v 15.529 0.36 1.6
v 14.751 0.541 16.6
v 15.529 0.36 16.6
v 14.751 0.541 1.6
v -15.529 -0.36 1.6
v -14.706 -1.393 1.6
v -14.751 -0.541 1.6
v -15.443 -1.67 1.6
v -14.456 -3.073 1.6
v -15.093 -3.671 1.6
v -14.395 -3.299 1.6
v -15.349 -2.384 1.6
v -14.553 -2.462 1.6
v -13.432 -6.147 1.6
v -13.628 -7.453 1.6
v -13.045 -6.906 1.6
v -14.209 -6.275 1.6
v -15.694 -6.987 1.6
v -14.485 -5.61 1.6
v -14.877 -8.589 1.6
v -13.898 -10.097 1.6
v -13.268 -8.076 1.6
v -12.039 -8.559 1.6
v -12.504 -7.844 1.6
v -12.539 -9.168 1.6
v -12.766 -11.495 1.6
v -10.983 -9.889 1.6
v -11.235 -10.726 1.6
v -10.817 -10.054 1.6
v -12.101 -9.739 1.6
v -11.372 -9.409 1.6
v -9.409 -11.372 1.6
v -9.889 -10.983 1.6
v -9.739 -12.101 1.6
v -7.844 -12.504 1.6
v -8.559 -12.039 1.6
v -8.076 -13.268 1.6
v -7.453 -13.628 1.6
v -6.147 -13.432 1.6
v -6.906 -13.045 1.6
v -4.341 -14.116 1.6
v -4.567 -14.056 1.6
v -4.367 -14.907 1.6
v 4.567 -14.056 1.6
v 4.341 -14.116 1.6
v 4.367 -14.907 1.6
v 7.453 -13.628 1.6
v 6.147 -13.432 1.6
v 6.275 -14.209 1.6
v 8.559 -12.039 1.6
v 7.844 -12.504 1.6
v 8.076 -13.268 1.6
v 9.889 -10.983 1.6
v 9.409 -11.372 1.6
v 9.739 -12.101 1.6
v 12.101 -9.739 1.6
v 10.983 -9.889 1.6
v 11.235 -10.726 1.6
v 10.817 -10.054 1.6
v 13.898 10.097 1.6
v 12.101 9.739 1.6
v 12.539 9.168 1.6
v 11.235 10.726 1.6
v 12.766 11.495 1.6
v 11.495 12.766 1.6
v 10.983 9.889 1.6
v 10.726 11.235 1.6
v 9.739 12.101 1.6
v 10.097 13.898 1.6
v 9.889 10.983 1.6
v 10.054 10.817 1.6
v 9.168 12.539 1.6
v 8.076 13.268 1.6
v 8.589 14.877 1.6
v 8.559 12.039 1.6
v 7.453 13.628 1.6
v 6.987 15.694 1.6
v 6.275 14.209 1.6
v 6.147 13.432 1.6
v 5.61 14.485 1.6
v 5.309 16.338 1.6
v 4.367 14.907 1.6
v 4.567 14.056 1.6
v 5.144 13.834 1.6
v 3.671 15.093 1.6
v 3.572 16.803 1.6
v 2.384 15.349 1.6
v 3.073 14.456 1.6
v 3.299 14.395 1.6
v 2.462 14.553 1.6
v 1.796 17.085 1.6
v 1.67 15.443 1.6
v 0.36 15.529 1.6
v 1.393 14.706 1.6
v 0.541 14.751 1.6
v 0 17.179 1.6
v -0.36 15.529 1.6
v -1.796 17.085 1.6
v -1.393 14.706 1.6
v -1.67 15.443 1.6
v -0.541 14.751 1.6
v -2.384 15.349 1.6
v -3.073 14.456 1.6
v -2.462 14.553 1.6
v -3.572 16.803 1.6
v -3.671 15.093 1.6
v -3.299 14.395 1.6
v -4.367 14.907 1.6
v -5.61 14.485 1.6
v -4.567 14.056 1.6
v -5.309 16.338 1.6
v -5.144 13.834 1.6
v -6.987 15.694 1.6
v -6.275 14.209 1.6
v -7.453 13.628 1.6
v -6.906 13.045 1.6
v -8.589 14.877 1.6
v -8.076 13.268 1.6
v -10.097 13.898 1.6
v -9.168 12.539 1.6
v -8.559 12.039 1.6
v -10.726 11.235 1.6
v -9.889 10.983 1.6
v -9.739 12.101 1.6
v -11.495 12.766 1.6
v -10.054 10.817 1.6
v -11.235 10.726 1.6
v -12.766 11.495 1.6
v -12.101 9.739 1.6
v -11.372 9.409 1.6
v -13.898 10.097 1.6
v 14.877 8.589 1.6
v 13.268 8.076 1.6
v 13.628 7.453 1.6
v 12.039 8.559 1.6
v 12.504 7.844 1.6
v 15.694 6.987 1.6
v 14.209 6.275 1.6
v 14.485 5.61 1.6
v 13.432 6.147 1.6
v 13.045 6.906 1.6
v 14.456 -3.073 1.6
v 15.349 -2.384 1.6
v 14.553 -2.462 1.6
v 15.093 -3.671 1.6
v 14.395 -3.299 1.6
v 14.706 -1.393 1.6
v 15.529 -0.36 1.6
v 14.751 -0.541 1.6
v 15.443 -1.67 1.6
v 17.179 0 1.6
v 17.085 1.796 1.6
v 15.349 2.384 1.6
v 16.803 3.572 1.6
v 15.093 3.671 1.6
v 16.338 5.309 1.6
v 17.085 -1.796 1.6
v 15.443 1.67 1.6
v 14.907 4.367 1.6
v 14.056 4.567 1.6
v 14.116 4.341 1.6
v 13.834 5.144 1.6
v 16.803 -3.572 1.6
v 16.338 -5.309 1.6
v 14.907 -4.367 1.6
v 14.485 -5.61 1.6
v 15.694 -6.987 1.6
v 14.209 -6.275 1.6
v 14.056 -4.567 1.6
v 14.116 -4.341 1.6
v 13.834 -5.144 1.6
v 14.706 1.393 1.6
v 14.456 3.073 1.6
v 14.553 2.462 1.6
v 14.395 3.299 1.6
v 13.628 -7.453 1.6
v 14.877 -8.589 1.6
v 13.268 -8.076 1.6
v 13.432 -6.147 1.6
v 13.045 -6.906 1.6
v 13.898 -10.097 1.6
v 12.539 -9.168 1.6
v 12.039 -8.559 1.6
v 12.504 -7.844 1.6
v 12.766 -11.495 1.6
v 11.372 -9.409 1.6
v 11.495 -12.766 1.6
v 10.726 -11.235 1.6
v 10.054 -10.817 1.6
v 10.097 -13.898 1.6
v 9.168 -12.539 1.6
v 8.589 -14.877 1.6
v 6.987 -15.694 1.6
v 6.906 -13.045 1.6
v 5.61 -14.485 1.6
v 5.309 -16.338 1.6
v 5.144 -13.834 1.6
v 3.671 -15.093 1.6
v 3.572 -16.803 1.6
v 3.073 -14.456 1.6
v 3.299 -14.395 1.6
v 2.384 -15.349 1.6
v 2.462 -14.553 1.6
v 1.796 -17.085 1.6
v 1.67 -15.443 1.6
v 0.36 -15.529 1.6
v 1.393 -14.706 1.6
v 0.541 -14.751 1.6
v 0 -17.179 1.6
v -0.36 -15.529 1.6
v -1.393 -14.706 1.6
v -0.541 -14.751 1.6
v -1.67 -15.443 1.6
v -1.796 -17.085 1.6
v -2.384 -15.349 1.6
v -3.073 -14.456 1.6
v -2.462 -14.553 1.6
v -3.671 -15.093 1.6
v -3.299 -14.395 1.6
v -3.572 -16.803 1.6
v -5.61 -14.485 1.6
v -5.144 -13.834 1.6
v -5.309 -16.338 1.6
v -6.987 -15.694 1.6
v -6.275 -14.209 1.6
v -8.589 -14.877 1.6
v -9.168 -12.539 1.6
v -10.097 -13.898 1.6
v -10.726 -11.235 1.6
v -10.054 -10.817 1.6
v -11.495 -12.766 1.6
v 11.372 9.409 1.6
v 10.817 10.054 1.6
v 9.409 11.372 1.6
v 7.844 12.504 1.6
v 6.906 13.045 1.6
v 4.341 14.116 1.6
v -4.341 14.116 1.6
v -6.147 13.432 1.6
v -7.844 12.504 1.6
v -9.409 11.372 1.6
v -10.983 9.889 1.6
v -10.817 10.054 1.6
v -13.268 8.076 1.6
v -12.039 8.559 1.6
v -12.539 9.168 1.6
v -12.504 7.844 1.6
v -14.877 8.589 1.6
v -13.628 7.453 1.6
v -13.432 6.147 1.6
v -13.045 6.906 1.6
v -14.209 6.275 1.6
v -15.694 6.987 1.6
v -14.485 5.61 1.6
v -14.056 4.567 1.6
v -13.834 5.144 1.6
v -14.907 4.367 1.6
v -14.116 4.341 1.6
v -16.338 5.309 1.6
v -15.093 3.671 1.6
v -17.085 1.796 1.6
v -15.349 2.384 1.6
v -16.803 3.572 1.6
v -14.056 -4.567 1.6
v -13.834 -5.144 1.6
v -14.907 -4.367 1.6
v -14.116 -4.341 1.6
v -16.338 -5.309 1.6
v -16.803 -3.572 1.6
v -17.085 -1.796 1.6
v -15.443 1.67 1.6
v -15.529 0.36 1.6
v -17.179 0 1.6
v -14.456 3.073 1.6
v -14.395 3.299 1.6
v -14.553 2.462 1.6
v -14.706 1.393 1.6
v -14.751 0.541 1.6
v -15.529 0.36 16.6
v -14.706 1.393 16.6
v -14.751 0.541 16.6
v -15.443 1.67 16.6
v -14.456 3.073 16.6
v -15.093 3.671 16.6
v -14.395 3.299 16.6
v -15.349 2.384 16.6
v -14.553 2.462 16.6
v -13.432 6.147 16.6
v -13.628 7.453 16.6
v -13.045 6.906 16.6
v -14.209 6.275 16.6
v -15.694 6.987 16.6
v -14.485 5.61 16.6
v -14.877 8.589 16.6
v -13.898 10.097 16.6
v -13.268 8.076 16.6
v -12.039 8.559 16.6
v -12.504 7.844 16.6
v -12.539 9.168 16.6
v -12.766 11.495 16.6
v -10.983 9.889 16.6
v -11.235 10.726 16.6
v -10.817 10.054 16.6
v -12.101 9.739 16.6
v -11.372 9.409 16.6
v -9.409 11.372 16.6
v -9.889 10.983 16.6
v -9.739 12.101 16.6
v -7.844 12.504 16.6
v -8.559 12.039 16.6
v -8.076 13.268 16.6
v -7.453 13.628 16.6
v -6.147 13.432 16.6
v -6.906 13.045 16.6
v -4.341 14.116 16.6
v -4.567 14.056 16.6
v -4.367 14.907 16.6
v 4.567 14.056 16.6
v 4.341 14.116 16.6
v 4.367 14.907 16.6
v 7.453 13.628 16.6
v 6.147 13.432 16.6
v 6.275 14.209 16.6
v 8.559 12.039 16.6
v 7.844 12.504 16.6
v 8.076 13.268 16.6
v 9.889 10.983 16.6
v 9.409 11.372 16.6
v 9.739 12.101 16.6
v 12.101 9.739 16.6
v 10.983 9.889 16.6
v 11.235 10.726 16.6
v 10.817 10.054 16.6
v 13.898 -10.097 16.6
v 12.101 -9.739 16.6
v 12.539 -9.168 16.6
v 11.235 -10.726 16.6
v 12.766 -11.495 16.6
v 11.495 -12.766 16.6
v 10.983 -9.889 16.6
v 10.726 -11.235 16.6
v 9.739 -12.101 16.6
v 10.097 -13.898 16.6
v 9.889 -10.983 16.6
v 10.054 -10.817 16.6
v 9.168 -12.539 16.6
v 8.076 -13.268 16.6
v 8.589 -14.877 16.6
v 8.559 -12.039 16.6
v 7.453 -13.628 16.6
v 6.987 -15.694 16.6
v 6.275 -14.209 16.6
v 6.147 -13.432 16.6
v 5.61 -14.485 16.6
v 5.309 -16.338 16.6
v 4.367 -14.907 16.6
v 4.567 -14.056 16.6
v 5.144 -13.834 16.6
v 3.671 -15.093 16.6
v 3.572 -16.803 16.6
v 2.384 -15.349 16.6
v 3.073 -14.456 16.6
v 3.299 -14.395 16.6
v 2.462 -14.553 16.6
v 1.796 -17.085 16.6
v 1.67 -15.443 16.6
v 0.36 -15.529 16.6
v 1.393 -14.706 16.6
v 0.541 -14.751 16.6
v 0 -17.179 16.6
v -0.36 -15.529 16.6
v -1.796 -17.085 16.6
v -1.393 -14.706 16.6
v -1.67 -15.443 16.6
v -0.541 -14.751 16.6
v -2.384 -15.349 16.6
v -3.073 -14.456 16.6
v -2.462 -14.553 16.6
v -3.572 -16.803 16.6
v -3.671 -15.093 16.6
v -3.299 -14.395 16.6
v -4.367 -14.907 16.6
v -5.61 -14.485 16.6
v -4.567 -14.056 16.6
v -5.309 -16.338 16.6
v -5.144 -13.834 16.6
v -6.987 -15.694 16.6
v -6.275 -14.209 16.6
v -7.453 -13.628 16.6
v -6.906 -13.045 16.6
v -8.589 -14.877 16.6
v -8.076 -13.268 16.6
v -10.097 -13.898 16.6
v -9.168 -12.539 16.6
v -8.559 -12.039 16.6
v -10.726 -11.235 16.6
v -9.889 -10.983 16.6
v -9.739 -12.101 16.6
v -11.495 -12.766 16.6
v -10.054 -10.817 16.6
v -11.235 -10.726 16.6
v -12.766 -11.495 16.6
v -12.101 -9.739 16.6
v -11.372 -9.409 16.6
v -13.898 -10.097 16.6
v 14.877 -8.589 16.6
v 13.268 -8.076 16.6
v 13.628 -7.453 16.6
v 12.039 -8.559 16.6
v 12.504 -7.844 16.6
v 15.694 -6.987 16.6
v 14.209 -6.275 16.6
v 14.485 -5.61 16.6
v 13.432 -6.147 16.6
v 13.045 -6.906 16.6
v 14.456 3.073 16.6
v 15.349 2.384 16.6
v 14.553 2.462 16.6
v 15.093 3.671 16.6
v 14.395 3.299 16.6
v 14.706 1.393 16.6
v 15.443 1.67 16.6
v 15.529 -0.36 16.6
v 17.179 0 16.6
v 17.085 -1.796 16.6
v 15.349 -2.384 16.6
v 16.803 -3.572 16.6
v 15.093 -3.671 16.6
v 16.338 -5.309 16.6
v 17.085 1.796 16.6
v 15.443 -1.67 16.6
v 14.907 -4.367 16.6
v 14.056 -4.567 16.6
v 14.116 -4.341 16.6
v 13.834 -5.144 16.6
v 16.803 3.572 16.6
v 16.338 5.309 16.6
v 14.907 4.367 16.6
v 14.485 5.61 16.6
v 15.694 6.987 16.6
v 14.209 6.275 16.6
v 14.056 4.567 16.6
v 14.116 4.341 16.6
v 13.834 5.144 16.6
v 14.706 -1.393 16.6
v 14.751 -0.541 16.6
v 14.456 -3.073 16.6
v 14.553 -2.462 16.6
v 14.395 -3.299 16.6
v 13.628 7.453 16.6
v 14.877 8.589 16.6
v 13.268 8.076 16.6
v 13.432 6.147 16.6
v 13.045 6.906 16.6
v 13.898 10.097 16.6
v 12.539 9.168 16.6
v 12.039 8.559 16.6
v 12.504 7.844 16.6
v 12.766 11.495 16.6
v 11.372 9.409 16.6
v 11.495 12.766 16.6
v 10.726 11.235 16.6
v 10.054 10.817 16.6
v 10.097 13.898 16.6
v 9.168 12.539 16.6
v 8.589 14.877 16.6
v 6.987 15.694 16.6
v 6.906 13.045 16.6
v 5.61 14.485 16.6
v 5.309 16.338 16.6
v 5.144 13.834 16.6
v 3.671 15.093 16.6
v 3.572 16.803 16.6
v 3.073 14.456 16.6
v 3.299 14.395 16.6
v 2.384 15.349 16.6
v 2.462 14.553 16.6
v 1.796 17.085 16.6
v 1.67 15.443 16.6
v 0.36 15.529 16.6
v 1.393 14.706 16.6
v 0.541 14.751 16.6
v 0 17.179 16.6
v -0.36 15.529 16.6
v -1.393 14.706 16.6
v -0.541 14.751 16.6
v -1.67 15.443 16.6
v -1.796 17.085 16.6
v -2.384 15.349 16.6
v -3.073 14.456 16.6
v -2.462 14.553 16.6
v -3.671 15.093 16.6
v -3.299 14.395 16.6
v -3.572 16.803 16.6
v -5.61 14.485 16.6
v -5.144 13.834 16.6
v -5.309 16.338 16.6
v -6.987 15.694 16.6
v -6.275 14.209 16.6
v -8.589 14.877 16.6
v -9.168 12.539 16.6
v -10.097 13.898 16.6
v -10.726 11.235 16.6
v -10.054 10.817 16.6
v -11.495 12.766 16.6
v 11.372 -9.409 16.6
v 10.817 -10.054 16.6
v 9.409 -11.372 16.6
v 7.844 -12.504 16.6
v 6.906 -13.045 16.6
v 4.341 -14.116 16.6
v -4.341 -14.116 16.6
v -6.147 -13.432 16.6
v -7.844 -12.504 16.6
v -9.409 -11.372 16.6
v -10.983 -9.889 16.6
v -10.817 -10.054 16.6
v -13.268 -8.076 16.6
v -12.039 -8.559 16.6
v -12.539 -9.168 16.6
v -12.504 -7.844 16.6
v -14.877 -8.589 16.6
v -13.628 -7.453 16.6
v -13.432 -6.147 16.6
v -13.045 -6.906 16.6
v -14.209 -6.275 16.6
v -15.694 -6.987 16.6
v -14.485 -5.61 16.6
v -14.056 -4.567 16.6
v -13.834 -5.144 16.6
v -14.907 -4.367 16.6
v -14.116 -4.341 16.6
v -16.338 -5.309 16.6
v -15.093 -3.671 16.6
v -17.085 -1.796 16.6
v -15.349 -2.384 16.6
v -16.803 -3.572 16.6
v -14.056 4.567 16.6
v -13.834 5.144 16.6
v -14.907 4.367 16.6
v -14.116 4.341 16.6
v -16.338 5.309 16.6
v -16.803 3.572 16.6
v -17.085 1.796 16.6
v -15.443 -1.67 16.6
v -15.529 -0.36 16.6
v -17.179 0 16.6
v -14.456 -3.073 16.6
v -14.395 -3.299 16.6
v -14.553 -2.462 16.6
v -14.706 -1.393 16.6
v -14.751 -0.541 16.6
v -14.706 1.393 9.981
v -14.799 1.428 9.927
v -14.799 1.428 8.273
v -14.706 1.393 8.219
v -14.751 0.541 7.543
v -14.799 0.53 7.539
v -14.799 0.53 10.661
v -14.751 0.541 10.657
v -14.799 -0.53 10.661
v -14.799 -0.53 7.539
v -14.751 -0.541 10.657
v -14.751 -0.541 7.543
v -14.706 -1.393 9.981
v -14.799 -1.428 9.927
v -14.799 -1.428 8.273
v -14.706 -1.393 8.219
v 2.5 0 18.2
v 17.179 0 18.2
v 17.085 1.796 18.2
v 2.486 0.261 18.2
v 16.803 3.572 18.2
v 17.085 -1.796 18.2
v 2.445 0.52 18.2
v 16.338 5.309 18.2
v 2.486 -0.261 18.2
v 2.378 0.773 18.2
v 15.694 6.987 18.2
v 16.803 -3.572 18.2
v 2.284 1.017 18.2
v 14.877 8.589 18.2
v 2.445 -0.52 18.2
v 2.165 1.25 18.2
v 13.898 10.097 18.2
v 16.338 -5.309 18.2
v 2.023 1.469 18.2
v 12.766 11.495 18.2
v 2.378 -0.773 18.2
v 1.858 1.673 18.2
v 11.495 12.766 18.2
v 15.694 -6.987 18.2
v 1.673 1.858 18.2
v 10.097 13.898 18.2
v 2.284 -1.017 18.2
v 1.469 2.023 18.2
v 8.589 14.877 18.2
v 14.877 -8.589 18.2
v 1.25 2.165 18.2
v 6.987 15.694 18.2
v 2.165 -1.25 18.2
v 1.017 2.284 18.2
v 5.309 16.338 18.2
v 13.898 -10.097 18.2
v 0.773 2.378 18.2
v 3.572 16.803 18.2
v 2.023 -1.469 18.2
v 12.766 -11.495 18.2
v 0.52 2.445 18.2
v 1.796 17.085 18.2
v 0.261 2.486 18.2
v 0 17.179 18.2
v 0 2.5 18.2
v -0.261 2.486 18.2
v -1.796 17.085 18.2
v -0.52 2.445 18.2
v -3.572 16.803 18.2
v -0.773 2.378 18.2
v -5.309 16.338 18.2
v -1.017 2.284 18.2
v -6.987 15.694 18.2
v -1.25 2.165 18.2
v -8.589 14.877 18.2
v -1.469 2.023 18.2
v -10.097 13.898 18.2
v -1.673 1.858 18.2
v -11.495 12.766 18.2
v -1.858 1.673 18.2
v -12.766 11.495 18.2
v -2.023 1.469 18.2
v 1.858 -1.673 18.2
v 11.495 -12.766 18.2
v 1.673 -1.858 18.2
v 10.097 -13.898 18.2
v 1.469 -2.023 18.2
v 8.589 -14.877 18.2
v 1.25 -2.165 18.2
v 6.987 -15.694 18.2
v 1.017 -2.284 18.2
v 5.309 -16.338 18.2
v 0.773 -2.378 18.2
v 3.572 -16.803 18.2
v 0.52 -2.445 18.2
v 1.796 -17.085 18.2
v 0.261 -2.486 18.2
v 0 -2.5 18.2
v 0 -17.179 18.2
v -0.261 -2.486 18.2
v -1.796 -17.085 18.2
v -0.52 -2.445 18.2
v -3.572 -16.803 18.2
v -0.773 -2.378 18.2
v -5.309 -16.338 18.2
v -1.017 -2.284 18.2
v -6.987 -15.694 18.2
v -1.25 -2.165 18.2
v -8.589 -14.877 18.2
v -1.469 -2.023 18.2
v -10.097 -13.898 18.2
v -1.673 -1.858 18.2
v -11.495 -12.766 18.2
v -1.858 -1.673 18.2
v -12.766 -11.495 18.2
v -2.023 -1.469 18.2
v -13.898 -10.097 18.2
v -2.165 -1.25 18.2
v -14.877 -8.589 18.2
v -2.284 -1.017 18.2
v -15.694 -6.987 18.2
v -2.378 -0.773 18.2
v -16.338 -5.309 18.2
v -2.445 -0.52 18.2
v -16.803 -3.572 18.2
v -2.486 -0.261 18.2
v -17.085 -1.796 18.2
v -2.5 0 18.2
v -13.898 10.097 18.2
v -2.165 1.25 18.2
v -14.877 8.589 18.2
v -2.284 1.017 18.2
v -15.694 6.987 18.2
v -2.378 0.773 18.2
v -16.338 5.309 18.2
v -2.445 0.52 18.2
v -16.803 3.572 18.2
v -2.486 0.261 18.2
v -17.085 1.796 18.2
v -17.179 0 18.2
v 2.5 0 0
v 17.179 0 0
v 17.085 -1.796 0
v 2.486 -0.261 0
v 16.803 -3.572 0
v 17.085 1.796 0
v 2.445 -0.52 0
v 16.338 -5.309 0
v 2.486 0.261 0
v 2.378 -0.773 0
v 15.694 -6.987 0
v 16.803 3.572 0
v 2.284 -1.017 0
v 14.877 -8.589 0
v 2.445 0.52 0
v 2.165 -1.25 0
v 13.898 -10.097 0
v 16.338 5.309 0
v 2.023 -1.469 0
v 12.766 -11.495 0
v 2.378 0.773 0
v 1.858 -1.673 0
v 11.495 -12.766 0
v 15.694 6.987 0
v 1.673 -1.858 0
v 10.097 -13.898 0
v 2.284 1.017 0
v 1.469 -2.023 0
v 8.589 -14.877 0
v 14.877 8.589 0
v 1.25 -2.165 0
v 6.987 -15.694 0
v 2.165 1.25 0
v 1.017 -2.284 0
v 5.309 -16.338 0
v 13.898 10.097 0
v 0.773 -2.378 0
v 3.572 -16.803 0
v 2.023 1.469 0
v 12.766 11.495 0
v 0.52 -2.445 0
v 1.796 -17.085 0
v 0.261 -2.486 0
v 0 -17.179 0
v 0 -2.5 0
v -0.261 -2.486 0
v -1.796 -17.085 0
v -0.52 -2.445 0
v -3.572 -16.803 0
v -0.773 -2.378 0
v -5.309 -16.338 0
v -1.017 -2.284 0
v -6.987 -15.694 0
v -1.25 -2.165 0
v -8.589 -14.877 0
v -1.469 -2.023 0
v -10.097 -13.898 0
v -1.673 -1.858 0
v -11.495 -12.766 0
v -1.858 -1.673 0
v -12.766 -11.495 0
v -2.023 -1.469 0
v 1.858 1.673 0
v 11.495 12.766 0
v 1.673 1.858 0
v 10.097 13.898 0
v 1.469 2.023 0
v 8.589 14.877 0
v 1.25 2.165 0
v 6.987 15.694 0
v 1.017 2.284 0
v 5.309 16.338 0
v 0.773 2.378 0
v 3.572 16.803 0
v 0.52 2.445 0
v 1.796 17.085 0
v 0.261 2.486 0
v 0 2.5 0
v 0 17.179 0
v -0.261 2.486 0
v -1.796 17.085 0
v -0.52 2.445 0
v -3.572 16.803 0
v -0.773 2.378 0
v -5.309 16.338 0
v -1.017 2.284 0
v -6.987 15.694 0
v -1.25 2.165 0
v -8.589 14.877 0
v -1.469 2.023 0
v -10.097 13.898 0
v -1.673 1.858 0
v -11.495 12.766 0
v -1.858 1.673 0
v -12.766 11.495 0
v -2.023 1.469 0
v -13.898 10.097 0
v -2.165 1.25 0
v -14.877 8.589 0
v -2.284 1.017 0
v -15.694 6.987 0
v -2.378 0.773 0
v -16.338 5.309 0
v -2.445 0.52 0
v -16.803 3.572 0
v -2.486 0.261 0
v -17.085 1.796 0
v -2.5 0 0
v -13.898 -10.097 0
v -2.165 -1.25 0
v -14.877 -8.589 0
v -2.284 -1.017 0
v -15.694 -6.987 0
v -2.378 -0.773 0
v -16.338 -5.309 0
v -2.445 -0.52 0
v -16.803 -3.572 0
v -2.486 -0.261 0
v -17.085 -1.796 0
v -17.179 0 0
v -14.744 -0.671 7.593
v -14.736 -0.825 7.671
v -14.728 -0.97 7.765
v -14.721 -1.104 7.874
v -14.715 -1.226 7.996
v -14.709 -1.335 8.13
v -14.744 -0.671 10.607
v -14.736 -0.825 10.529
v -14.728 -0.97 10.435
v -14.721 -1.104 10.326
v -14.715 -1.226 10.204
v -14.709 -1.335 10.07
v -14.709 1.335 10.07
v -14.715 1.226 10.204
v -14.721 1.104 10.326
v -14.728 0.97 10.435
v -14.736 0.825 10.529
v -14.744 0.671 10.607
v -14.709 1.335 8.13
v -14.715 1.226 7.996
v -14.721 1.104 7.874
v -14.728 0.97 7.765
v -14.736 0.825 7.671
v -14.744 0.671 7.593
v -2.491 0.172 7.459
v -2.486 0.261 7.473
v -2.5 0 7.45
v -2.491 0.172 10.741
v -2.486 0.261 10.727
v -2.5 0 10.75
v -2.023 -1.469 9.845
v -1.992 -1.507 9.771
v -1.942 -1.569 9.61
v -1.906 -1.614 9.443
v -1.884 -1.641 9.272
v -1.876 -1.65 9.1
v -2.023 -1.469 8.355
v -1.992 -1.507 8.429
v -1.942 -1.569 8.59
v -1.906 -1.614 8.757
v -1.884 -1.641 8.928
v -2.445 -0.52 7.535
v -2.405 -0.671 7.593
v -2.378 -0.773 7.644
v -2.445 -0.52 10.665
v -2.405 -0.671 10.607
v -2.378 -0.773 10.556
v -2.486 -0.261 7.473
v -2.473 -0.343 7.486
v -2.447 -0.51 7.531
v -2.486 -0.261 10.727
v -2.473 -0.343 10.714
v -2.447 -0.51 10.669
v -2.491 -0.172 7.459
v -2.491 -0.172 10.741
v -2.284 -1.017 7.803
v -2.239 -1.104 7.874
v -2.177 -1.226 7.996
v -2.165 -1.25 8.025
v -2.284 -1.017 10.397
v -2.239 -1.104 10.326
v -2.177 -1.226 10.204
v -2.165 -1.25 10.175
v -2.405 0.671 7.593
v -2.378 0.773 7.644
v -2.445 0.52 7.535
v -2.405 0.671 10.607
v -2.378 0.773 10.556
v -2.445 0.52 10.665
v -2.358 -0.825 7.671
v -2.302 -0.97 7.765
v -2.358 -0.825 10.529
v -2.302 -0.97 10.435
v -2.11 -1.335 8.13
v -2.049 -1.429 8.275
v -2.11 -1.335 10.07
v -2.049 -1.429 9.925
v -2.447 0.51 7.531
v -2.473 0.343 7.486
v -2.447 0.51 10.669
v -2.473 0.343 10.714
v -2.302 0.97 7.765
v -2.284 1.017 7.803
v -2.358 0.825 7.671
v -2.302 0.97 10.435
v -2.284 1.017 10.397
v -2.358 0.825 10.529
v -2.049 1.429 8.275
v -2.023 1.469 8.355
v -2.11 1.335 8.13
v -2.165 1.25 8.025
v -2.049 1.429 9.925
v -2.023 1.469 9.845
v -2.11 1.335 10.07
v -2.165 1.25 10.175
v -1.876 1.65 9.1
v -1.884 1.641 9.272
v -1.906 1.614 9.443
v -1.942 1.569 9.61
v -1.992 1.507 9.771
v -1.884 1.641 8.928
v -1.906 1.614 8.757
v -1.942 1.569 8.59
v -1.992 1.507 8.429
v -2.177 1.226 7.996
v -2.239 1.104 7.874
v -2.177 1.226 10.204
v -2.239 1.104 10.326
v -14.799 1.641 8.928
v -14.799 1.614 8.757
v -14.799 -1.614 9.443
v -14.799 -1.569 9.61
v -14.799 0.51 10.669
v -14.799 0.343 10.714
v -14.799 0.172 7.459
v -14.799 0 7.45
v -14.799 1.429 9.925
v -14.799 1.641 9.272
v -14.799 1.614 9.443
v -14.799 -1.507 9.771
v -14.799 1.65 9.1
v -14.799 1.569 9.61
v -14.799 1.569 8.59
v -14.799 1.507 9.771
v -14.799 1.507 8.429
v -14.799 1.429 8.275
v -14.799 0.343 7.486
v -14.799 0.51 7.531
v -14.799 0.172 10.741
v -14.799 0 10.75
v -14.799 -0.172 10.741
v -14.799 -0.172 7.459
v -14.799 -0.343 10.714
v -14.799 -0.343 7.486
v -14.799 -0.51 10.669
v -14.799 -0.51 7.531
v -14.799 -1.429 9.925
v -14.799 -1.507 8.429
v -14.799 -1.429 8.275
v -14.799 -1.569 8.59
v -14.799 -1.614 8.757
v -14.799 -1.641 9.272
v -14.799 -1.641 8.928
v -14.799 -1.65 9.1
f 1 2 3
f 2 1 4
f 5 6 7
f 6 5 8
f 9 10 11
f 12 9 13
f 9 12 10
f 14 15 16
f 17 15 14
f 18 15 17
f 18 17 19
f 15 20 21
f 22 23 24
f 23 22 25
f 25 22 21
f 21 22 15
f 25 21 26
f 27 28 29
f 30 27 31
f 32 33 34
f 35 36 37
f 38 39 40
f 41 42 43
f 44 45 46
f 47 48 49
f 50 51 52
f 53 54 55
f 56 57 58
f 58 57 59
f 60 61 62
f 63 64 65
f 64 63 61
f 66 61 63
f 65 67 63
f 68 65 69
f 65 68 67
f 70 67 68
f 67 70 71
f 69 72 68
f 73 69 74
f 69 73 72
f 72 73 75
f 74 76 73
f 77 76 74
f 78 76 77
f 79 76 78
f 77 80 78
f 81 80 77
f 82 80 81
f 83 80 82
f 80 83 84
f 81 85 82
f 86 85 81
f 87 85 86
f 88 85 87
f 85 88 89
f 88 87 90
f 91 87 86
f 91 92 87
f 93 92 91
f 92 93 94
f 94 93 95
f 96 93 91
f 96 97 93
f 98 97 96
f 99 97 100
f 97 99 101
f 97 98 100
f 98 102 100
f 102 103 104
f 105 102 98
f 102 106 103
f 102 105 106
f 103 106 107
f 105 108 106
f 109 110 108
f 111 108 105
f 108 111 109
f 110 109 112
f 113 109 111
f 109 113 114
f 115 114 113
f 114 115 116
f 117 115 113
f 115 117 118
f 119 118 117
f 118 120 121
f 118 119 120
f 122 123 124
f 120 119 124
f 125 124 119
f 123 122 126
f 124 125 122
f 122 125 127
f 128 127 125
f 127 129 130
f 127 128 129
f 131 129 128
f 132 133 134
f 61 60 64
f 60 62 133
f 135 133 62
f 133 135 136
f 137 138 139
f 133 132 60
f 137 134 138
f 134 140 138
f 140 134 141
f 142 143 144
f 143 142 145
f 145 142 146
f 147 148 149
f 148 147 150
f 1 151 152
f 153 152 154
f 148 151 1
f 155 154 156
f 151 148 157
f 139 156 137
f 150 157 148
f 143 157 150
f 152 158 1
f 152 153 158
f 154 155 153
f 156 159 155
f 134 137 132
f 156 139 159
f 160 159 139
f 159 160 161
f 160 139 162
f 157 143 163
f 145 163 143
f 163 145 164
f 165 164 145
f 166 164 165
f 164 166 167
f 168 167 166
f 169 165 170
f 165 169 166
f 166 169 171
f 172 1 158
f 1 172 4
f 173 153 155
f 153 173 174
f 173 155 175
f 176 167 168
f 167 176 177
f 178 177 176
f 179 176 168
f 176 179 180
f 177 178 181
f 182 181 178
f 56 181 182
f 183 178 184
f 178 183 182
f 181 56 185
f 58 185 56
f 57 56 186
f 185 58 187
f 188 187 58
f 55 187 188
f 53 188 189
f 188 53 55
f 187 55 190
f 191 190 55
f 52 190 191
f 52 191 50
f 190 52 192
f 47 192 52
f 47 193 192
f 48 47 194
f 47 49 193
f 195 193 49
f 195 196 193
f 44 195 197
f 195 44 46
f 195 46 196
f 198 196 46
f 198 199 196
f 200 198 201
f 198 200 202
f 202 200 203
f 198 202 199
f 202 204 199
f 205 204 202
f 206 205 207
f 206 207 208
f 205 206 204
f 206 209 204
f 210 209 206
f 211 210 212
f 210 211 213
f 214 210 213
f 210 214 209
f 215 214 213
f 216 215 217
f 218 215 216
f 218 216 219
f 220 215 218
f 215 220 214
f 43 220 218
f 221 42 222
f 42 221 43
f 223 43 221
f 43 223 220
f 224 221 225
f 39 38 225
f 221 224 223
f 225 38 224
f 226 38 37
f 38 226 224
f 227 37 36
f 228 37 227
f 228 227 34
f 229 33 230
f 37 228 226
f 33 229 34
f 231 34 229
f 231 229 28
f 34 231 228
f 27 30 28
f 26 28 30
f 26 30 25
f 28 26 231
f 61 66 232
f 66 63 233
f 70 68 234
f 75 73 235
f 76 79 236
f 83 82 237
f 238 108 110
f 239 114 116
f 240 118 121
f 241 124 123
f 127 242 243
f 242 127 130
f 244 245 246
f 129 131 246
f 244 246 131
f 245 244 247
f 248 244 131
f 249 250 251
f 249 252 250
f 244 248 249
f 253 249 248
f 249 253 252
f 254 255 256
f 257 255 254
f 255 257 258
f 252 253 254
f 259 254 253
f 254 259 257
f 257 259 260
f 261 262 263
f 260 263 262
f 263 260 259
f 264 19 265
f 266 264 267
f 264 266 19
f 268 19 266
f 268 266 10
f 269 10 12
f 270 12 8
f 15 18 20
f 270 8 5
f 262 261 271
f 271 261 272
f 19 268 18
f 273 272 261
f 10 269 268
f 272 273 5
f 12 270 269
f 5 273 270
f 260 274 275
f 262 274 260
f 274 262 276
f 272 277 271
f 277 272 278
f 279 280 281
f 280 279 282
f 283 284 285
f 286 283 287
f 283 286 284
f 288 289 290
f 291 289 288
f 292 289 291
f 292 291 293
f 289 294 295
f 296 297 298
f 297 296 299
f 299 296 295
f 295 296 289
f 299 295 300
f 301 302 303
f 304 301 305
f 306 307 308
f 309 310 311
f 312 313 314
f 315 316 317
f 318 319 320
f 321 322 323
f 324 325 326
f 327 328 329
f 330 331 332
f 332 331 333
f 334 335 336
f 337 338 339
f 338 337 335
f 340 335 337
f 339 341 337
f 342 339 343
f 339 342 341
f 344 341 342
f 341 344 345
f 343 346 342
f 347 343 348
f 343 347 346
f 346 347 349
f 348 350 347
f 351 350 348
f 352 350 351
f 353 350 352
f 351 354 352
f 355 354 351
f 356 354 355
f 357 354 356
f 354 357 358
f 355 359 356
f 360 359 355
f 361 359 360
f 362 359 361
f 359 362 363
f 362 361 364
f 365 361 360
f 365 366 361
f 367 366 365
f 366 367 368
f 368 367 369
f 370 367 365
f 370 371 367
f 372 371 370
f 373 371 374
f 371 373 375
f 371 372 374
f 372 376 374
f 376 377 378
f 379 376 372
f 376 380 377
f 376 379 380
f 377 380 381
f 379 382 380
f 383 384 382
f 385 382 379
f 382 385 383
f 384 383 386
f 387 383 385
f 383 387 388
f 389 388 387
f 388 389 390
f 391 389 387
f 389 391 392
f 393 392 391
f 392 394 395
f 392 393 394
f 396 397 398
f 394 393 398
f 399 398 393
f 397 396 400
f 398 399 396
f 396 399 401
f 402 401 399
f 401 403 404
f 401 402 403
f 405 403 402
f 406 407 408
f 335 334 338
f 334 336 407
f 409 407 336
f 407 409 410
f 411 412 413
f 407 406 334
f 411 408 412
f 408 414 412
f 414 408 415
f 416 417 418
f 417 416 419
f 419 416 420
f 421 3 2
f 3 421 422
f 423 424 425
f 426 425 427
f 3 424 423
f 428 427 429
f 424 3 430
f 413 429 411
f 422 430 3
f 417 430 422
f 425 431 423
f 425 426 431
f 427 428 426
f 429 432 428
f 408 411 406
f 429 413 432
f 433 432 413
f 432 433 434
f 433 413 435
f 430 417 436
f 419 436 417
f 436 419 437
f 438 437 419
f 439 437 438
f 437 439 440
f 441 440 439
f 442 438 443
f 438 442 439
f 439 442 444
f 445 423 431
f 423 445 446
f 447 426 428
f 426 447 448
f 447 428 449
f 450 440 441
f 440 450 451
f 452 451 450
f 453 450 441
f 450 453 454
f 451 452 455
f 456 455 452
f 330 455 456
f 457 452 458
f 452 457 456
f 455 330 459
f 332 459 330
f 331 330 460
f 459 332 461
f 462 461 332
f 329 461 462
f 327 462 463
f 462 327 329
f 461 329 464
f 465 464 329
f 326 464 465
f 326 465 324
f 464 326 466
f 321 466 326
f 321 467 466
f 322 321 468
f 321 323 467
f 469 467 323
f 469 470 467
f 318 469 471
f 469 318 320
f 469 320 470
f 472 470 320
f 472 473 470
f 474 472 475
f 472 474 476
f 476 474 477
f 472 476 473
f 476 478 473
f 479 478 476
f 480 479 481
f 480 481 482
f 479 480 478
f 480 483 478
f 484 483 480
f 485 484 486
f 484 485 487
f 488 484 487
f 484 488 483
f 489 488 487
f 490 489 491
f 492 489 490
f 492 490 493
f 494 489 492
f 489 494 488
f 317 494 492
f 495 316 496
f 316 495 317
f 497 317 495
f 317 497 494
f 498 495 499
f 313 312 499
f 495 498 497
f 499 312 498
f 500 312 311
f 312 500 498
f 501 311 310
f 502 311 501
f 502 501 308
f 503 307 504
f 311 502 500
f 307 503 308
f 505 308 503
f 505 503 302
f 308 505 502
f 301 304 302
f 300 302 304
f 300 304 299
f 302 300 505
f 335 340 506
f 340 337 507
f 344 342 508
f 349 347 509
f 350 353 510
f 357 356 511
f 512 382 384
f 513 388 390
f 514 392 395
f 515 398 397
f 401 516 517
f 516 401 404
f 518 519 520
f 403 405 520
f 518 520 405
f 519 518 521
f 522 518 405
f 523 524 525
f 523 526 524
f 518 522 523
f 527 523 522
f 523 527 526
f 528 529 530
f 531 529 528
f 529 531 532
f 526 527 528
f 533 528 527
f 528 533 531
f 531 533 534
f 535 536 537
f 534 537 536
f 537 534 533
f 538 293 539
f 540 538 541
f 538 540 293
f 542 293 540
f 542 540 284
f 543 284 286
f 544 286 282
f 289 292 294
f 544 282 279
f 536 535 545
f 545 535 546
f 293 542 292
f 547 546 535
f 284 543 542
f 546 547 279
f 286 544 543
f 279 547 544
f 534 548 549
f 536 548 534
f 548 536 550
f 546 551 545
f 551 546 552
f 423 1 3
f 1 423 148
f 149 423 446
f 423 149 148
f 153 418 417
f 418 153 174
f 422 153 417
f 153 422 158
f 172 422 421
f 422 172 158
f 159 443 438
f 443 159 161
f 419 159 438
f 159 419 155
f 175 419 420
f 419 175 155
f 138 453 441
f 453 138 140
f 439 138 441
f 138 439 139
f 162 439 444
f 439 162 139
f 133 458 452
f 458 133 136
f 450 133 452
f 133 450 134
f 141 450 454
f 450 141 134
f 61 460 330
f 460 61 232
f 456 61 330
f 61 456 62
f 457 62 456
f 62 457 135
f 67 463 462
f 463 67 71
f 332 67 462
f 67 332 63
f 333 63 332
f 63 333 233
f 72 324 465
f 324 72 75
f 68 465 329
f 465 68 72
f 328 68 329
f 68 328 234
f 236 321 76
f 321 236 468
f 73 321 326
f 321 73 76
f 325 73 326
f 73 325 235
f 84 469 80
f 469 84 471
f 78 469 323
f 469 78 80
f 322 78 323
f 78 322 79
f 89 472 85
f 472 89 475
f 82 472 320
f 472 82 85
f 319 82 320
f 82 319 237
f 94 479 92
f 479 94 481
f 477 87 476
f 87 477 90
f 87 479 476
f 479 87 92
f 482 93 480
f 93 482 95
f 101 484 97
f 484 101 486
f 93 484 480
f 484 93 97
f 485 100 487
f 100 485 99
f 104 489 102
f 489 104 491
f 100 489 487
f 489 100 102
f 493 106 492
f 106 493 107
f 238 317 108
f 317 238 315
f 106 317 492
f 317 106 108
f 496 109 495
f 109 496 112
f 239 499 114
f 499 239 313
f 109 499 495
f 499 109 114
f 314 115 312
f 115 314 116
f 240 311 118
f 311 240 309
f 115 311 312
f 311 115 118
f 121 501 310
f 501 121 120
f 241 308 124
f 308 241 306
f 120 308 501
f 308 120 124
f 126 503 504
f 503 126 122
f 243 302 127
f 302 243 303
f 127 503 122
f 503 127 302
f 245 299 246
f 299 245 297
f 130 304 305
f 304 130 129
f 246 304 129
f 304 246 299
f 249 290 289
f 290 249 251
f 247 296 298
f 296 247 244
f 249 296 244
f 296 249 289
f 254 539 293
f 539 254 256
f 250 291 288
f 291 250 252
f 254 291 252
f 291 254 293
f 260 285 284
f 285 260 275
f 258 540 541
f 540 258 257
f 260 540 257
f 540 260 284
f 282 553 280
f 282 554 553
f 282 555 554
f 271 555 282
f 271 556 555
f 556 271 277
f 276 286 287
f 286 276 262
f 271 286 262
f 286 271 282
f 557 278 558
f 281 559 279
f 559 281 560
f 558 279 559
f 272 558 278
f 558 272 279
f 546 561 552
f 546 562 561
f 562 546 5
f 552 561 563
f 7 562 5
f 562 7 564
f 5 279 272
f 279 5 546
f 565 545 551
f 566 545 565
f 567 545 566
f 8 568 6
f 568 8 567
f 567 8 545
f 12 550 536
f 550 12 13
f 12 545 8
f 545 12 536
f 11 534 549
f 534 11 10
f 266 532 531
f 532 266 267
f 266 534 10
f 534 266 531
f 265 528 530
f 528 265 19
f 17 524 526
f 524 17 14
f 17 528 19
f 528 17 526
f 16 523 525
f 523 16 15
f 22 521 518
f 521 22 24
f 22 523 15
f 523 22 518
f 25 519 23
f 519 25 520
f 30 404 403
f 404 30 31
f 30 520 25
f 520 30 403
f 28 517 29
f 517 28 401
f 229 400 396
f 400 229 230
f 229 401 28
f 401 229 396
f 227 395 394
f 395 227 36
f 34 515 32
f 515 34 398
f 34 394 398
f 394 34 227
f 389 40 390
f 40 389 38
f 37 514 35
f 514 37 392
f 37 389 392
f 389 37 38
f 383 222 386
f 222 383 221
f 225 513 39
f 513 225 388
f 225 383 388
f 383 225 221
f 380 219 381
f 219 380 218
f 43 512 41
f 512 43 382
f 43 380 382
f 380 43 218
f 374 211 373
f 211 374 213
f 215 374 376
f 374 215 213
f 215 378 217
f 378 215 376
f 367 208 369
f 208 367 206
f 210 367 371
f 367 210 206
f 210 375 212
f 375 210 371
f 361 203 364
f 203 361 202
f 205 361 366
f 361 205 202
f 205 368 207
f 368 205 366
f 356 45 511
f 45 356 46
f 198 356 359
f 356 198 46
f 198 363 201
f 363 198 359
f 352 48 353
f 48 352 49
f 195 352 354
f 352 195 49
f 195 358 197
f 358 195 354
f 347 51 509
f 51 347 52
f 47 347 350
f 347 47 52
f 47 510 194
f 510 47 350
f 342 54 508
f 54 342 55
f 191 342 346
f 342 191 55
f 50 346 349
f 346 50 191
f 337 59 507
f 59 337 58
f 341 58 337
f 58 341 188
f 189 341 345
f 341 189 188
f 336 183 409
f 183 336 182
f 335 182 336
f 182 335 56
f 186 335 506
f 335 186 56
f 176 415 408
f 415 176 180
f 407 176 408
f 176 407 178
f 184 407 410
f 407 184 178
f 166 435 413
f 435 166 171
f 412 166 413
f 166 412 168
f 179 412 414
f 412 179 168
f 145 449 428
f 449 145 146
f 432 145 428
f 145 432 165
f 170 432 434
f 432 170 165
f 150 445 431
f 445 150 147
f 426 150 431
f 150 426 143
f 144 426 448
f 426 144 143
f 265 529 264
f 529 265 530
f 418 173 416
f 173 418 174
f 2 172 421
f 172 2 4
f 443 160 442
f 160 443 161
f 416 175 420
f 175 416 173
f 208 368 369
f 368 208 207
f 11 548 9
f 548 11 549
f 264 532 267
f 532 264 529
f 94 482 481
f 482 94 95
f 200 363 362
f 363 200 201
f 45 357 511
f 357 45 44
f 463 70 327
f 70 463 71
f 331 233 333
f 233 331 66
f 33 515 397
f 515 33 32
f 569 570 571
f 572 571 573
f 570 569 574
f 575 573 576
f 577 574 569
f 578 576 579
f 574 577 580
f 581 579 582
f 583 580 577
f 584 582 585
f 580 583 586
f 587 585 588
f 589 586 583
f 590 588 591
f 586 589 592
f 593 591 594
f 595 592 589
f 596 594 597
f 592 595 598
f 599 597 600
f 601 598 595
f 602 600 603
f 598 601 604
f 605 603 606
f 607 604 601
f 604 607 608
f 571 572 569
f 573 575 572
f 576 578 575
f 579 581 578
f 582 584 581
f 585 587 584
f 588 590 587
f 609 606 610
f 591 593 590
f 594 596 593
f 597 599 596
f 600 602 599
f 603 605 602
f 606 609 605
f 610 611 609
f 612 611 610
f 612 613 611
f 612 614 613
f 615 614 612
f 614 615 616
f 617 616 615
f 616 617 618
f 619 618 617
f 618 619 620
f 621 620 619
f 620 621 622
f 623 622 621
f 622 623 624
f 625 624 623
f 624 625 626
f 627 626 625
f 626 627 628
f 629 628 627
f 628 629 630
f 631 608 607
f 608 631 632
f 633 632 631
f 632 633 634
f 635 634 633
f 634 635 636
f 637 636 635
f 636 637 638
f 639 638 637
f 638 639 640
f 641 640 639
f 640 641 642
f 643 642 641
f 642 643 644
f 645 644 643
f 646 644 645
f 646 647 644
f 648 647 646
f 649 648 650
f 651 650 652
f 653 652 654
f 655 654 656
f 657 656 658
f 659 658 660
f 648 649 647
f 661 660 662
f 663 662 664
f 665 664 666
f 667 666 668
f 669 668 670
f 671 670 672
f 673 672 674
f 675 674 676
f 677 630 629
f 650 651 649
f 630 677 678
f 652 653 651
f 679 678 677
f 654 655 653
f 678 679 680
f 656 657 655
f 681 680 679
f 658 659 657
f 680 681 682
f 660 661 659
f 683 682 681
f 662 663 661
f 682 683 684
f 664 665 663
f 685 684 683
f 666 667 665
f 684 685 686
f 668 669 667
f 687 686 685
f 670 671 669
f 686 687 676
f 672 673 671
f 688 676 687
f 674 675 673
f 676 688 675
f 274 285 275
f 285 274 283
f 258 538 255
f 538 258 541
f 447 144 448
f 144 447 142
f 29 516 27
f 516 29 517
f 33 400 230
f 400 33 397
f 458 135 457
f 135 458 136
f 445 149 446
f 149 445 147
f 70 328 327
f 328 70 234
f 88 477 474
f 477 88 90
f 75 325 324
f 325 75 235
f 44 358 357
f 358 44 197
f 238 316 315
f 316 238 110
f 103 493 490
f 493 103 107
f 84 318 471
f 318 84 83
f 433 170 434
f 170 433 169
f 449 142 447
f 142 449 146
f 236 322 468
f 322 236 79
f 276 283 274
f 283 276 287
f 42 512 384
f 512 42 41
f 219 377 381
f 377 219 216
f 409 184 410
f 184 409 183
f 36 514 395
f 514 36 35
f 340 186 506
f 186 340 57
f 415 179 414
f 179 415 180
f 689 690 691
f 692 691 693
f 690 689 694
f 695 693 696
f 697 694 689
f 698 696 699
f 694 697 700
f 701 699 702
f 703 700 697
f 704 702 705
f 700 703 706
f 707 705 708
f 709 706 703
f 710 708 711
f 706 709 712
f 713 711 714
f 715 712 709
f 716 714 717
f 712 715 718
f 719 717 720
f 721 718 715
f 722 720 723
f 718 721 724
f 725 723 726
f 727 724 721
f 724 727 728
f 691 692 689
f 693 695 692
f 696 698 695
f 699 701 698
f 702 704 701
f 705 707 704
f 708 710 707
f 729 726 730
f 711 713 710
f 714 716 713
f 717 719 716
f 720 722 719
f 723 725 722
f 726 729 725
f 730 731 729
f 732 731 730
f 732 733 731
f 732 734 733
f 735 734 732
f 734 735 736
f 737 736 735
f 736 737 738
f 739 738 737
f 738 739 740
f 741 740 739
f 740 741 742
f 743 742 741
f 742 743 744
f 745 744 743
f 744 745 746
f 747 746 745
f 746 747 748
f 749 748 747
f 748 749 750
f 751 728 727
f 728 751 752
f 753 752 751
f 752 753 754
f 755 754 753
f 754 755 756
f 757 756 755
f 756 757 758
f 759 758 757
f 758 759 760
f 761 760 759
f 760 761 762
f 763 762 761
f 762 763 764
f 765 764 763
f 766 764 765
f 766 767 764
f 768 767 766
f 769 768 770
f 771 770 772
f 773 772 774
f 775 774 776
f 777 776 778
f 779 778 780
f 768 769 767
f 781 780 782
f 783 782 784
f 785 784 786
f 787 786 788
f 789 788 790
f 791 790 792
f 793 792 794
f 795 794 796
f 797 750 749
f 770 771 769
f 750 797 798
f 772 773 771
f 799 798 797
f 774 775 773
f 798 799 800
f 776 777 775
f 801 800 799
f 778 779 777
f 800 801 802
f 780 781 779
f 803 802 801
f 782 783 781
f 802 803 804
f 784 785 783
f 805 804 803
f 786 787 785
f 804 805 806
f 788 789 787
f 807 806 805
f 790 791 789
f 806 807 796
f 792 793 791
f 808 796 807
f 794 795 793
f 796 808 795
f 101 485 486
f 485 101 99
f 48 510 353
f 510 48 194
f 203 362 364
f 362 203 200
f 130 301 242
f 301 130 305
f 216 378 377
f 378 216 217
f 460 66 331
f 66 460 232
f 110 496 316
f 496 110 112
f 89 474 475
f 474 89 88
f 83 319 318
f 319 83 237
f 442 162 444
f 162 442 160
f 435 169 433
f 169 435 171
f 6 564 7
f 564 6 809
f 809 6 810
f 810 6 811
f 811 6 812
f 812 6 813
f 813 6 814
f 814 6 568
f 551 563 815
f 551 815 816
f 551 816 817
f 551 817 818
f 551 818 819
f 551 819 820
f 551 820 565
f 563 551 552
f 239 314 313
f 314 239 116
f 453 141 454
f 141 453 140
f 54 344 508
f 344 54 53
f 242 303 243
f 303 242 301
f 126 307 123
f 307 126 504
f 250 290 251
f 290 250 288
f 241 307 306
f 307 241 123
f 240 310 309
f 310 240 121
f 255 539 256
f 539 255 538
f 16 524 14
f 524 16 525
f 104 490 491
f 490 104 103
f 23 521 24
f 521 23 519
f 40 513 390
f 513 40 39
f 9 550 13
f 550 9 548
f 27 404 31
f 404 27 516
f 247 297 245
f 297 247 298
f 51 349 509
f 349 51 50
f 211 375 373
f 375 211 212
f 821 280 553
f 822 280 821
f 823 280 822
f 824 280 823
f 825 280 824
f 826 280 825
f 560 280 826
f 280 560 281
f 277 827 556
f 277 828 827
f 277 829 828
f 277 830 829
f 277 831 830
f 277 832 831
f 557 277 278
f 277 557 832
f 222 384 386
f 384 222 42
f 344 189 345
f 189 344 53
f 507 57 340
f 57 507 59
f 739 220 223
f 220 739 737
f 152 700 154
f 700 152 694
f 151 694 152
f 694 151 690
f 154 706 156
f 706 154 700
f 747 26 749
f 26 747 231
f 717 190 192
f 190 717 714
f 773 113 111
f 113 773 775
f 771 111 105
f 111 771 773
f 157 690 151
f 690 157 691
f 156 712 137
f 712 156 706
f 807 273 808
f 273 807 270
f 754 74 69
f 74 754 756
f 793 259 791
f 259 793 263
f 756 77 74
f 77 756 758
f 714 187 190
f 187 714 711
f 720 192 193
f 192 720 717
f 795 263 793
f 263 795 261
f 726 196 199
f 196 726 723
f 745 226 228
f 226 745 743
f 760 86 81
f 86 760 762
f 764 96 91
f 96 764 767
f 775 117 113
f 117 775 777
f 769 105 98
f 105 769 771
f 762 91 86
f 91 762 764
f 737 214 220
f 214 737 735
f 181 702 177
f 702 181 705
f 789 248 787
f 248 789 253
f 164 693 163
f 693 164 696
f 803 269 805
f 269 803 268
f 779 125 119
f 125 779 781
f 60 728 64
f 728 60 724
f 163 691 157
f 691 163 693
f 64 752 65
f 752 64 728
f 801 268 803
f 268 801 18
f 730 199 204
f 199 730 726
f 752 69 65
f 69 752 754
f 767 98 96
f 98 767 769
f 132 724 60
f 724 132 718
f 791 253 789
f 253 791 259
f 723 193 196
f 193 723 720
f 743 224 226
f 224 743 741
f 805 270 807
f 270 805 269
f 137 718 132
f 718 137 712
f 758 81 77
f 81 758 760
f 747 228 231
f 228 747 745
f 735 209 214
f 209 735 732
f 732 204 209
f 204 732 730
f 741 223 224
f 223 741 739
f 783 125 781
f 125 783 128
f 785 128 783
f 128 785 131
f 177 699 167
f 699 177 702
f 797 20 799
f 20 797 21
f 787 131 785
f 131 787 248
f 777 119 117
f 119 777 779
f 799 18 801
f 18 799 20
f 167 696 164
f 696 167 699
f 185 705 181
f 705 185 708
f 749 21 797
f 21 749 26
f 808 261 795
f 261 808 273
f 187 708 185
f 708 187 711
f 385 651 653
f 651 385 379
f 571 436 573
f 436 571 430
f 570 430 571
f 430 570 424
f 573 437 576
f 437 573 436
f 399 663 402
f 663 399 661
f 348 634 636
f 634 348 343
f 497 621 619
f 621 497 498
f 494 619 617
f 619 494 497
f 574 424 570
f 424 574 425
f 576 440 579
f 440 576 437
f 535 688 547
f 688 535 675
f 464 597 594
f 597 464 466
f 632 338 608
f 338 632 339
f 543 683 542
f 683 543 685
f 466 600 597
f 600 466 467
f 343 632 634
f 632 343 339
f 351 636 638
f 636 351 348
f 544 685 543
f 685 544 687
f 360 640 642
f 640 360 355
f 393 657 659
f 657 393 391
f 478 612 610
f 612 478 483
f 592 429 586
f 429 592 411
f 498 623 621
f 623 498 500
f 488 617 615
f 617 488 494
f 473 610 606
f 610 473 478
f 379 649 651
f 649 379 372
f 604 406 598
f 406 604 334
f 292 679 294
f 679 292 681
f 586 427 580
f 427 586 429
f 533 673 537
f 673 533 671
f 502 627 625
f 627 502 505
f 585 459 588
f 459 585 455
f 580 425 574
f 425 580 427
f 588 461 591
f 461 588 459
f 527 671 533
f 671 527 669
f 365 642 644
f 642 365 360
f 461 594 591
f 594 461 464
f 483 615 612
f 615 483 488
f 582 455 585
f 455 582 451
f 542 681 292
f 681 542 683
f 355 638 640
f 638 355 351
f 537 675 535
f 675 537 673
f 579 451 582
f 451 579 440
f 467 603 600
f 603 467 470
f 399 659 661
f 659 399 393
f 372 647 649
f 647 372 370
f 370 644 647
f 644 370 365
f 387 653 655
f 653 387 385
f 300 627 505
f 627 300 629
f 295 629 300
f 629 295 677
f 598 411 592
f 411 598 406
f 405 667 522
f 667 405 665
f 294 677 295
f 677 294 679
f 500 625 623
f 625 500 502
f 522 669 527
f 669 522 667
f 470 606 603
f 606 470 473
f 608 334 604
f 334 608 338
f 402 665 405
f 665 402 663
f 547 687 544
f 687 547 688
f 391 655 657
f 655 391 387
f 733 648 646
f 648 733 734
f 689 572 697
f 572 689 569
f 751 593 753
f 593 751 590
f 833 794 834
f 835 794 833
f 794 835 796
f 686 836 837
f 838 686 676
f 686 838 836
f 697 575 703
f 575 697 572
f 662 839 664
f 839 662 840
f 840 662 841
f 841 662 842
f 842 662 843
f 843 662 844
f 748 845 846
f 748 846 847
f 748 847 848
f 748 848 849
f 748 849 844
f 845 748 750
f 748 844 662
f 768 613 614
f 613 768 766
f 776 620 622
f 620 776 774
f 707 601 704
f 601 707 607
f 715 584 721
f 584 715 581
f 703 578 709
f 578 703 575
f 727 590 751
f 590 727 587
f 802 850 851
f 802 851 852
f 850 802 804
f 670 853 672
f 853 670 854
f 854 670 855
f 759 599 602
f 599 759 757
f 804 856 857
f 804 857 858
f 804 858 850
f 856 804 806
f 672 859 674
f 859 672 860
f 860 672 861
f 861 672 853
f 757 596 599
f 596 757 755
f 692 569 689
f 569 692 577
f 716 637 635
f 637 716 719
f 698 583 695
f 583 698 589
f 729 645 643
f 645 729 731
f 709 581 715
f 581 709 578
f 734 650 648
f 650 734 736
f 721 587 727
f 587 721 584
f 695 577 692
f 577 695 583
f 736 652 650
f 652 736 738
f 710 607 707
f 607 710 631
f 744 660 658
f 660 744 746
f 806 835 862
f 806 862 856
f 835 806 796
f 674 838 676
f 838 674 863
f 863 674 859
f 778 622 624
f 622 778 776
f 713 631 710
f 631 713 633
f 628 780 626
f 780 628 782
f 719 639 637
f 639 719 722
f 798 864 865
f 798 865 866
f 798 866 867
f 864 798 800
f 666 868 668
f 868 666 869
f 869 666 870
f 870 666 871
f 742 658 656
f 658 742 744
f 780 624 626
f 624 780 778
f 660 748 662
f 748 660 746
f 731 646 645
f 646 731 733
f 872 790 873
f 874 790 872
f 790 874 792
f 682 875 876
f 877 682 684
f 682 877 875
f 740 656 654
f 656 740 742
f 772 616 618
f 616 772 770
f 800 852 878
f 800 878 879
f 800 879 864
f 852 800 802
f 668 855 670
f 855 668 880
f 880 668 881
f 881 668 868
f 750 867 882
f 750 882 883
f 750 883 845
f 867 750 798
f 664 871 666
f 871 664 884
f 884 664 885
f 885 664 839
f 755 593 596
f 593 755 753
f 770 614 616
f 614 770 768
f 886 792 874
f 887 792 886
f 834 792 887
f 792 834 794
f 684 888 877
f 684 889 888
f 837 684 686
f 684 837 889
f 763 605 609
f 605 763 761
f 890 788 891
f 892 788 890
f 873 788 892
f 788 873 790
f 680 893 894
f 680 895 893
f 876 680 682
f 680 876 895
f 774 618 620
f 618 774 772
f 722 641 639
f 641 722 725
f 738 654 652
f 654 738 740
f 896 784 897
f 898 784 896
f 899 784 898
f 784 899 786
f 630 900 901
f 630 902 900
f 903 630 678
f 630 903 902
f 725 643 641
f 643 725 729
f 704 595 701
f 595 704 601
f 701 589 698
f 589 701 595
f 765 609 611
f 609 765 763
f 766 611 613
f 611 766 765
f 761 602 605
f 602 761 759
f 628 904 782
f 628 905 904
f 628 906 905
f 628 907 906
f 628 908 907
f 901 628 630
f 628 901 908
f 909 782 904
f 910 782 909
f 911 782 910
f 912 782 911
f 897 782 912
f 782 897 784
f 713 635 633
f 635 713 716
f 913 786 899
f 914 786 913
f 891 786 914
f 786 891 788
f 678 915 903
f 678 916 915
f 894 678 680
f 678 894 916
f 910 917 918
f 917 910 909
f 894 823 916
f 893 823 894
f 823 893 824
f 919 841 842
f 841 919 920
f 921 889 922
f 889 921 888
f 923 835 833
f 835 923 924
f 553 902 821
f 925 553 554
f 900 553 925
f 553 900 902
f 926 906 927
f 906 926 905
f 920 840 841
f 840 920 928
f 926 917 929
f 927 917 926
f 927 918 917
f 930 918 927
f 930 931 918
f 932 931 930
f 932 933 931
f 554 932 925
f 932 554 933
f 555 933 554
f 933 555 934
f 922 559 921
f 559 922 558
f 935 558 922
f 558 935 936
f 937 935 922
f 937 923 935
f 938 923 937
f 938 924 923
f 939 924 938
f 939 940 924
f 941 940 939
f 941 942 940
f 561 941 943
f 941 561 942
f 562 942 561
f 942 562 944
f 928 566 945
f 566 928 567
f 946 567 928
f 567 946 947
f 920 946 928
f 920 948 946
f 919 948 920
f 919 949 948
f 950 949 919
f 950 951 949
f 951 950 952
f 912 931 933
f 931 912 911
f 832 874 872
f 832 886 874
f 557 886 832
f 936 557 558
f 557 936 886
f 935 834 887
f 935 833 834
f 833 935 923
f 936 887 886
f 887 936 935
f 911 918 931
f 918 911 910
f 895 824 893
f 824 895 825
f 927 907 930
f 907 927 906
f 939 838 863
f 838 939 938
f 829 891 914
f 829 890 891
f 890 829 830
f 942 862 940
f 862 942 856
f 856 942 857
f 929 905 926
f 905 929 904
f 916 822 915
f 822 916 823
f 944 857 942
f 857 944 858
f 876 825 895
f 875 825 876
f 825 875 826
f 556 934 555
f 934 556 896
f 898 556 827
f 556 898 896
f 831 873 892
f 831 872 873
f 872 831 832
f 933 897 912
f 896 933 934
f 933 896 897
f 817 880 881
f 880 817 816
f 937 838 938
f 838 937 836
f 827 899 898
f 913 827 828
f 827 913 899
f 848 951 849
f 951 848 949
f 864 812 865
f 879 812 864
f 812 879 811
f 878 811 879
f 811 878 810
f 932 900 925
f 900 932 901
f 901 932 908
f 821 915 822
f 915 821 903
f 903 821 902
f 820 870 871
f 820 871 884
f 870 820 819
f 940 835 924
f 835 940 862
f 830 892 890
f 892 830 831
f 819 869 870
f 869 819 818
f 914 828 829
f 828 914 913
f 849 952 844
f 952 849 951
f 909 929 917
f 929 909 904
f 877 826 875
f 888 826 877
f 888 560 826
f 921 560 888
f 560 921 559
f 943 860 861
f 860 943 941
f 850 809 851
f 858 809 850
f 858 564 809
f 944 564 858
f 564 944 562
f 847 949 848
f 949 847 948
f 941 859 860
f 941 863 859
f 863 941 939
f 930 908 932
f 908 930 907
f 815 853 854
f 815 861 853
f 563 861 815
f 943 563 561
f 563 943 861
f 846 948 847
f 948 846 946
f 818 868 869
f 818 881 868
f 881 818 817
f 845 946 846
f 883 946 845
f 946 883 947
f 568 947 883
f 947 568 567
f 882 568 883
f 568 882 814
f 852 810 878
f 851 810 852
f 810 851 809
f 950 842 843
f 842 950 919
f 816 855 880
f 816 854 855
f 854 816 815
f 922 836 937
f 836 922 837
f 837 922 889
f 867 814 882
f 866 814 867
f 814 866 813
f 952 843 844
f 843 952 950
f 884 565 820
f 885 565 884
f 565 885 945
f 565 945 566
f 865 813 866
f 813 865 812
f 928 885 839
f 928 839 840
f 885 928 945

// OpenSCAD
// GT2 pulley, 48 teeth for 15 mm belt.
$fn = 60;
eps = 0.02;
teeth = 48;
belt_pitch = 2;
belt_w = 15;
shaft_d = 5;
set_screw_d = 3.3;
tooth_depth = 0.75;
tooth_overlap = 0.28;
tooth_base_w = 1.2;
tooth_tip_w = 0.72;
flange_t = 1.6;
core_d = teeth * belt_pitch / PI - 1.0;
body_h = belt_w + 2 * flange_t;
module tooth() {
    linear_extrude(height = belt_w)
        polygon(points = [[-tooth_overlap, -tooth_base_w / 2], [tooth_depth, -tooth_tip_w / 2], [tooth_depth, tooth_tip_w / 2], [-tooth_overlap, tooth_base_w / 2]]);
}
difference() {
    union() {
        cylinder(d = core_d, h = body_h);
        cylinder(d = core_d + 4.8, h = flange_t);
        translate([0, 0, body_h - flange_t]) cylinder(d = core_d + 4.8, h = flange_t);
        for (i = [0 : teeth - 1]) rotate([0, 0, i * 360 / teeth]) translate([core_d / 2, 0, flange_t]) tooth();
    }
    translate([0, 0, -eps]) cylinder(d = shaft_d, h = body_h + 2 * eps);
    translate([-core_d / 2 - eps, 0, body_h / 2]) rotate([0, 90, 0]) cylinder(d = set_screw_d, h = core_d / 2 + 2 * eps);
}
